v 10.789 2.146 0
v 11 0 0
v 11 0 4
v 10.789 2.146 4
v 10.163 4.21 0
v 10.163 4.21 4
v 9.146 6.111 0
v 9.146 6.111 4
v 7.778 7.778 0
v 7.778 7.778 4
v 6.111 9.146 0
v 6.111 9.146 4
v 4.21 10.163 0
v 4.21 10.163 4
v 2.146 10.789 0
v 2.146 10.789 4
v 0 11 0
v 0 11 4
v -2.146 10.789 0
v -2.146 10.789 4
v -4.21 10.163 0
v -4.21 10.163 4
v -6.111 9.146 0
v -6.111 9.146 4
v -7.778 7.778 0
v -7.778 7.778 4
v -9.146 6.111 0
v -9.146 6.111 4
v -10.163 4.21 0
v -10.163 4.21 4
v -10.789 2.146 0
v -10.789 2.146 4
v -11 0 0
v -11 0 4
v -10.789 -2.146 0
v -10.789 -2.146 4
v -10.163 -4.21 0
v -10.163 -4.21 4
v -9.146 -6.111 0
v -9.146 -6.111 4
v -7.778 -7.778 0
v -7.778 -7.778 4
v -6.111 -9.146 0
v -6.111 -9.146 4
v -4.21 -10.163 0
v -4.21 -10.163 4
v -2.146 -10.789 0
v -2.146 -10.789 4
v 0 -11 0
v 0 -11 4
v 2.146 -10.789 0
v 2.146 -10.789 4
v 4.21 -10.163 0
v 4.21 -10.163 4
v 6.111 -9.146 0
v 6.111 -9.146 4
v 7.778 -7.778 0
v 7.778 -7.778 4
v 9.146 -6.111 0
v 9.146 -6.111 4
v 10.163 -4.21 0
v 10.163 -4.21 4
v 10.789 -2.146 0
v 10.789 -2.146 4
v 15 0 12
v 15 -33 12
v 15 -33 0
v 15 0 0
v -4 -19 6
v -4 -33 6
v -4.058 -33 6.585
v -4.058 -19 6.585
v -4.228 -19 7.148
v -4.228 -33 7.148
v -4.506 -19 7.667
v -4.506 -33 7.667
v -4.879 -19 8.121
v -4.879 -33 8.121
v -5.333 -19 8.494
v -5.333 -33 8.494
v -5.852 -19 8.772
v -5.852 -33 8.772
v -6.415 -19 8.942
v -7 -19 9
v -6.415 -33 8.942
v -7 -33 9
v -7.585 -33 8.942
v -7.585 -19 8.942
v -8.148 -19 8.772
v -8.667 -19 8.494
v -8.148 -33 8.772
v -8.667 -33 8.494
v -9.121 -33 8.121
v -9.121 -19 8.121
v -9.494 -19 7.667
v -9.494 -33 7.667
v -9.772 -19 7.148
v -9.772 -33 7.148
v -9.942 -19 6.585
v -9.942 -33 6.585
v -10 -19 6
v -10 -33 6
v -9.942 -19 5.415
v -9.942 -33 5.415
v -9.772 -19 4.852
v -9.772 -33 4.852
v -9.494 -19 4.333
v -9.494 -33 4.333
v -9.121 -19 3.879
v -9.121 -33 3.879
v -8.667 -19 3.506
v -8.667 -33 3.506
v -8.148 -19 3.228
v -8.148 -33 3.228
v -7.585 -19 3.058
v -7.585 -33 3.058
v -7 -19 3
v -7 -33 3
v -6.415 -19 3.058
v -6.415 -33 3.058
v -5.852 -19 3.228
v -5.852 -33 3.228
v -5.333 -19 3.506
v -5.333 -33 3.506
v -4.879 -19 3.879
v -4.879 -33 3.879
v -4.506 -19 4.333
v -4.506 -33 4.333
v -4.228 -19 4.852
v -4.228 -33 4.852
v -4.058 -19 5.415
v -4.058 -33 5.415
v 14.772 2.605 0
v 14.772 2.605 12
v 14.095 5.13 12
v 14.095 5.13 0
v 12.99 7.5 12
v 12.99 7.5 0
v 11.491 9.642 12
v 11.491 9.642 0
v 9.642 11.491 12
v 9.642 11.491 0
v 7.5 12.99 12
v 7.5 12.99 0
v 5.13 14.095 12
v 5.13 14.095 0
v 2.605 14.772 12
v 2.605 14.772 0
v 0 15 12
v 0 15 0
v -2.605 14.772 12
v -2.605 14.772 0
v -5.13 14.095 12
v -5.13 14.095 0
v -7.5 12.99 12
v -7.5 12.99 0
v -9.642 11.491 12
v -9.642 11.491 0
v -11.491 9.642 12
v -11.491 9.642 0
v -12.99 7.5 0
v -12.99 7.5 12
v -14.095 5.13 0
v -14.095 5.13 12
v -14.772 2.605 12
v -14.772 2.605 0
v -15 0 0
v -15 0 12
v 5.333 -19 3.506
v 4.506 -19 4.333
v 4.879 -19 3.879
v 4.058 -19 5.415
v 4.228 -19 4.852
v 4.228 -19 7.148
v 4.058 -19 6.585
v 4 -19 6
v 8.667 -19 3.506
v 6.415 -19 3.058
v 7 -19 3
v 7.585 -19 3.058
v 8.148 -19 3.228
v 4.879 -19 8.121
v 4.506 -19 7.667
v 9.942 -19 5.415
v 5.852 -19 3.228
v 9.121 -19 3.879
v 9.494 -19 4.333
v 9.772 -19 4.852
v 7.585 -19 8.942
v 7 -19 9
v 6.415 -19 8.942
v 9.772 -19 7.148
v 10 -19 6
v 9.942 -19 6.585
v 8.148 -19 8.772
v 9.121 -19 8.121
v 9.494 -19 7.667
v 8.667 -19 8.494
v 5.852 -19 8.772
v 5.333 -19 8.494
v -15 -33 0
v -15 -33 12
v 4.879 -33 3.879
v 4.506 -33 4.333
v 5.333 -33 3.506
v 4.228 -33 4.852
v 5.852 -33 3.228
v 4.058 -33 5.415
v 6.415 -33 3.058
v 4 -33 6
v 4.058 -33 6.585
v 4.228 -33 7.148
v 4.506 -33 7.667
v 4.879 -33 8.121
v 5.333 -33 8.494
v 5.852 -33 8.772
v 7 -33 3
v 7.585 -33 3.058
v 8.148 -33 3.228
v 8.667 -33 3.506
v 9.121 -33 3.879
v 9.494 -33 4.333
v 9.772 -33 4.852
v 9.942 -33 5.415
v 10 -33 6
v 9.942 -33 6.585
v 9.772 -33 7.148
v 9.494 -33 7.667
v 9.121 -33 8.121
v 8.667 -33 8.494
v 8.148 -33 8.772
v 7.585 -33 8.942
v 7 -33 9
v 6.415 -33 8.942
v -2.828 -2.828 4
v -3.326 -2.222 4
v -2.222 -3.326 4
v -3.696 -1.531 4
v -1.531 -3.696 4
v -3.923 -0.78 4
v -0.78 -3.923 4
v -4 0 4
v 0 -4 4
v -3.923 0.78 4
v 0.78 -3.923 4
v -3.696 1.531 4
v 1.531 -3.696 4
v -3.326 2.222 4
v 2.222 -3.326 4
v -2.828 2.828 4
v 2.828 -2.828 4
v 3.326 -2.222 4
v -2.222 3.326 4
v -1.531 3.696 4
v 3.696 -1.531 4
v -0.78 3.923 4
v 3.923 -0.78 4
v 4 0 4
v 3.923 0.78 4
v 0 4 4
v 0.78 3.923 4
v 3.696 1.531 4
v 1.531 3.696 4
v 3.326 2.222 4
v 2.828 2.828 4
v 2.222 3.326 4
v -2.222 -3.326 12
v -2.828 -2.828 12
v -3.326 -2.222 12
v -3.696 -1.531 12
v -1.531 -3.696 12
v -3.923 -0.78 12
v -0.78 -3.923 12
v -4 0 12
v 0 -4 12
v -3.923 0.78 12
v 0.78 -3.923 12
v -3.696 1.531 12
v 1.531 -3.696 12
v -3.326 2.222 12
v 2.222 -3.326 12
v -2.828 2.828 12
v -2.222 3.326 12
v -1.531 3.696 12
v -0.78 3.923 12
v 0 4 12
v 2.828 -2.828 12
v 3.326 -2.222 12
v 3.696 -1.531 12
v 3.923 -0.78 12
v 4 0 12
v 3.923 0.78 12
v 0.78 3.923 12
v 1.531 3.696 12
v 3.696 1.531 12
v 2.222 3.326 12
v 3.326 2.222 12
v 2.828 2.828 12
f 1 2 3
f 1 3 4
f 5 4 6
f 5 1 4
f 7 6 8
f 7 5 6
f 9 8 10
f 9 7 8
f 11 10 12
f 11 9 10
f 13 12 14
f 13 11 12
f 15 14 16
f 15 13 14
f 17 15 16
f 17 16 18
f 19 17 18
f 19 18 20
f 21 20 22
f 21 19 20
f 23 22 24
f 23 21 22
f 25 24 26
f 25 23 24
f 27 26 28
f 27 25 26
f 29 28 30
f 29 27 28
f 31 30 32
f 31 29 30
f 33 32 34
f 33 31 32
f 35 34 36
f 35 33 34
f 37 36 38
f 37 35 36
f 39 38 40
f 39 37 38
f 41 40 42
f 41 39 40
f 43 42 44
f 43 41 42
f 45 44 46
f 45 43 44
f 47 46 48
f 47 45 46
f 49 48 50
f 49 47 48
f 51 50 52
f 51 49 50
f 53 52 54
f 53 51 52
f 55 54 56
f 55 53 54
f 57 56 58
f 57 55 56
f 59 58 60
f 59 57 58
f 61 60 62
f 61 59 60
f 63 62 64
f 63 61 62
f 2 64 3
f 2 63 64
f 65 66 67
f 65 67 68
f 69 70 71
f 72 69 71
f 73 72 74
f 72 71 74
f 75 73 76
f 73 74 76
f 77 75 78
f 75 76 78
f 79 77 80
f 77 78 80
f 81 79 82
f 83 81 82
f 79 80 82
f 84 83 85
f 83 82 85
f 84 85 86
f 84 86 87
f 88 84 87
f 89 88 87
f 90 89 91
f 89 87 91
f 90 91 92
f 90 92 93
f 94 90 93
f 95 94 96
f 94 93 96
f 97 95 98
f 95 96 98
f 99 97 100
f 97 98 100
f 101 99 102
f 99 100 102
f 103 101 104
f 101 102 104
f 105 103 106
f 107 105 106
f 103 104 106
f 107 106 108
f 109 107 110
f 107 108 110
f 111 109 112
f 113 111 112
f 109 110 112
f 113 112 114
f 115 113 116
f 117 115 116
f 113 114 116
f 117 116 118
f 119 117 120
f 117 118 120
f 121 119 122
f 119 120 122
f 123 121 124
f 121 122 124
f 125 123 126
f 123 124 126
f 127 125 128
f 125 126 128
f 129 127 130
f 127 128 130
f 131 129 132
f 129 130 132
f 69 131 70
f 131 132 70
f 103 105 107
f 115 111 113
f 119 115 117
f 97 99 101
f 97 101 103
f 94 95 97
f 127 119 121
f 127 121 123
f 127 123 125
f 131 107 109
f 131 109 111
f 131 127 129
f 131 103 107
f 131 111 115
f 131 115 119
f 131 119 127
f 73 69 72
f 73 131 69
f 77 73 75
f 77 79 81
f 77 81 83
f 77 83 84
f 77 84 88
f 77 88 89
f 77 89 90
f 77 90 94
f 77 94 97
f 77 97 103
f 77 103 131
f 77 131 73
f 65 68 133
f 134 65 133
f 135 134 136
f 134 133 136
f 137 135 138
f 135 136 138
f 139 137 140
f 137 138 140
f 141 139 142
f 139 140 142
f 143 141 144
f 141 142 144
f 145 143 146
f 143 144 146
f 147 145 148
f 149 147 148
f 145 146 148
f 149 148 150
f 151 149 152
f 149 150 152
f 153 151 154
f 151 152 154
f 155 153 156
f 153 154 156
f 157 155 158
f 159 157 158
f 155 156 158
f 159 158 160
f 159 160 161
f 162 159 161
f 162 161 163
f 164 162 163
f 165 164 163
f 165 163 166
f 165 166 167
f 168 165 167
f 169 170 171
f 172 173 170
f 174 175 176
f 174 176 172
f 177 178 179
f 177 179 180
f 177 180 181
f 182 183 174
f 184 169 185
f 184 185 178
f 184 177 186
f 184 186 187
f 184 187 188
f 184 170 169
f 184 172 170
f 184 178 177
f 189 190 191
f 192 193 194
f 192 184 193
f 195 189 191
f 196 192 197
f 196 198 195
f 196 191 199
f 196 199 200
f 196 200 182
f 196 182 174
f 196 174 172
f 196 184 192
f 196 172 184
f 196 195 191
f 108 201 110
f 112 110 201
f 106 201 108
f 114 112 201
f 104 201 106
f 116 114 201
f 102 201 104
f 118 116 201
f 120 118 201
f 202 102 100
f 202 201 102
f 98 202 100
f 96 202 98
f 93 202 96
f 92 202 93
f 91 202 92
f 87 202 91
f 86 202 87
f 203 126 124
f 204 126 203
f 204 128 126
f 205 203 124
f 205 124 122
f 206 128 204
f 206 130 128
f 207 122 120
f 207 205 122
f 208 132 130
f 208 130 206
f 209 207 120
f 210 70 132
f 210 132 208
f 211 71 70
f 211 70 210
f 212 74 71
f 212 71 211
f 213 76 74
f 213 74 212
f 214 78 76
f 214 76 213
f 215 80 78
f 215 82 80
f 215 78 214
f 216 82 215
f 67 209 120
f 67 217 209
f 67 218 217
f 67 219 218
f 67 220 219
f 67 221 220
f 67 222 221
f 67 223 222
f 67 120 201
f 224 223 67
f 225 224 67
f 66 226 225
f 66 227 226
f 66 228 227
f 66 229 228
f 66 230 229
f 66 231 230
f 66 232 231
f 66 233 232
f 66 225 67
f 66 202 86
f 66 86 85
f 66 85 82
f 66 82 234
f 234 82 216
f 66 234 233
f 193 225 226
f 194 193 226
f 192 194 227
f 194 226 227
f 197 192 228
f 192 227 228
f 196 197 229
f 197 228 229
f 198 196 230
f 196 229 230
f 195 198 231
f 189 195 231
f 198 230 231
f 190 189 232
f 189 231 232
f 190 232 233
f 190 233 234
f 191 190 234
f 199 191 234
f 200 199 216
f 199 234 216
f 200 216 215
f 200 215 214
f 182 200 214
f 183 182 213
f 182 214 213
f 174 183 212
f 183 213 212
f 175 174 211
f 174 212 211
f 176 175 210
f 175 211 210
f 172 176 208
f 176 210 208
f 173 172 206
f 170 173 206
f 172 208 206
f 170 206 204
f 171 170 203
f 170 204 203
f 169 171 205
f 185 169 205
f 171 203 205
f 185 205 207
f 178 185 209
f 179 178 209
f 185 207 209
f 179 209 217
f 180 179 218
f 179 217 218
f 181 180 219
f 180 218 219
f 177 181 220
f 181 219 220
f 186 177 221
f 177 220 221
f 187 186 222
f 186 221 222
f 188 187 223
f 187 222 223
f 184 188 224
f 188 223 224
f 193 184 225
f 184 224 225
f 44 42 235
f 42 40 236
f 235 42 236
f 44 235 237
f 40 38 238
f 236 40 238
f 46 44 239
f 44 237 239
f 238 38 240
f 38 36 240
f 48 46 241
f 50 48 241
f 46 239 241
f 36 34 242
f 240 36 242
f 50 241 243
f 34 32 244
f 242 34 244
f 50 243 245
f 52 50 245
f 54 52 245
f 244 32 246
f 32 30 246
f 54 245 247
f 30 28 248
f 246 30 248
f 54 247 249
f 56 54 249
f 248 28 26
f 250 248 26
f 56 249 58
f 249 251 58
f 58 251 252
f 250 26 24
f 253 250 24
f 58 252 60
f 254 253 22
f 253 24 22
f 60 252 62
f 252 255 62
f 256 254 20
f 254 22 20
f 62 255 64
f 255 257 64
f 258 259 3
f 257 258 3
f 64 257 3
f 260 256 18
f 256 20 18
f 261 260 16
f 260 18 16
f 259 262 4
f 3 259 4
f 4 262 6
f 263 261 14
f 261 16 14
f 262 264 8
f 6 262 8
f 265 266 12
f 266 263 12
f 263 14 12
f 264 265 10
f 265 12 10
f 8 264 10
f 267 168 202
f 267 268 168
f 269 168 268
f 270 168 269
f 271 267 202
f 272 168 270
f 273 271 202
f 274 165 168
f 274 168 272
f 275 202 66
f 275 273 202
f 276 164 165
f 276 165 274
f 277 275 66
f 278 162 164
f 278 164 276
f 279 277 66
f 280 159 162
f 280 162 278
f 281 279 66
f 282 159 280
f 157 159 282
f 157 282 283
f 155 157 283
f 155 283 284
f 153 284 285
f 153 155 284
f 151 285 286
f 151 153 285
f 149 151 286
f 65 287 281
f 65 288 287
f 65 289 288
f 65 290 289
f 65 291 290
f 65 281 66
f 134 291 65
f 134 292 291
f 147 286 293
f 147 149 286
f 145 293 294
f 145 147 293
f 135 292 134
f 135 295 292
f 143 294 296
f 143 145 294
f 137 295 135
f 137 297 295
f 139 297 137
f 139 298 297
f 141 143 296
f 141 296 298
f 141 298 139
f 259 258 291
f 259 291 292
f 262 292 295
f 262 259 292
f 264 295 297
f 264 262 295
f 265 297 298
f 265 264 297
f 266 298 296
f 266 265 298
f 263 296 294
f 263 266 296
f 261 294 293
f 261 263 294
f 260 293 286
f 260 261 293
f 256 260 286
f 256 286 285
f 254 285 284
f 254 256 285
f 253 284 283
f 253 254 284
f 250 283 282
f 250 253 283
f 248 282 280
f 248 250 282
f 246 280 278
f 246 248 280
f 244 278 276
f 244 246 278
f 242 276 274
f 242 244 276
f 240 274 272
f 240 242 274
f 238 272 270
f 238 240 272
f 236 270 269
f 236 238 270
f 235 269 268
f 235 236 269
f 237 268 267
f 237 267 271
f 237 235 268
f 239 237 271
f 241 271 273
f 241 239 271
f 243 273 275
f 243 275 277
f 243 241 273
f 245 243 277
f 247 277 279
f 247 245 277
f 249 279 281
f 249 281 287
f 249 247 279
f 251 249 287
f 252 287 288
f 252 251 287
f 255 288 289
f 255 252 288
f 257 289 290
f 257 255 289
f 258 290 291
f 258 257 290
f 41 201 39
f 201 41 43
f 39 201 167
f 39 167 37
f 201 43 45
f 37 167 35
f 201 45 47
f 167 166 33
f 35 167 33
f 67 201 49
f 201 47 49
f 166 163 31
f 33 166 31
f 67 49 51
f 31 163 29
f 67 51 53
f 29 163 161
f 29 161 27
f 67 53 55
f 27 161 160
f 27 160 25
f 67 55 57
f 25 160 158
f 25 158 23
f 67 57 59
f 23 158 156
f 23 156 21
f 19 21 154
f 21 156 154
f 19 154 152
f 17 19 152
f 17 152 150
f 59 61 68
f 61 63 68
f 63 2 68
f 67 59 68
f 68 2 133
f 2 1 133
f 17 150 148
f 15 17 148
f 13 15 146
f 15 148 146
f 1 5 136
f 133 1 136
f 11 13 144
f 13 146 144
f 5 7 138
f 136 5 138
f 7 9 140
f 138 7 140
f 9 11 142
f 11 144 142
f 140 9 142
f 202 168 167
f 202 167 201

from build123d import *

# Parameters (mm, degrees)
SKETCH2_R           = 15
SKETCH2_R_2         = 11
BOSS_EXTRUDE1_DEPTH = 4
SKETCH3_R           = 15
SKETCH3_R_2         = 4
BOSS_EXTRUDE2_DEPTH = 8
BOSS_EXTRUDE5_DEPTH = 12
SKETCH7_R           = 3
CUT_EXTRUDE1_DEPTH  = 14


with BuildPart() as part:
    # Sketch2 → Boss-Extrude1 (new body)
    with BuildSketch(Plane.XY):
        Circle(SKETCH2_R)
        Circle(SKETCH2_R_2, mode=Mode.SUBTRACT)
    extrude(amount=BOSS_EXTRUDE1_DEPTH)

    # Sketch3 → Boss-Extrude2 (add)
    with BuildSketch(Plane.XY.offset(4)):
        Circle(SKETCH3_R)
        Circle(SKETCH3_R_2, mode=Mode.SUBTRACT)
    extrude(amount=BOSS_EXTRUDE2_DEPTH)

    # Sketch6 → Boss-Extrude5 (add)
    with BuildSketch(Plane.XY.offset(12)):
        with BuildLine():
            Line((-15, 0), (-15, -33))
            Line((-15, -33), (15, -33))
            Line((15, -33), (15, 0))
            ThreePointArc((15, 0), (0, -15), (-15, 0))
        make_face()
    extrude(amount=-BOSS_EXTRUDE5_DEPTH)

    # Sketch7 → Cut-Extrude1 (cut)
    with BuildSketch(Plane.XZ.offset(33)):
        with Locations((7, 6)):
            Circle(SKETCH7_R)
        with Locations((-7, 6)):
            Circle(SKETCH7_R)
    extrude(amount=-CUT_EXTRUDE1_DEPTH, mode=Mode.SUBTRACT)


solid = part.part
